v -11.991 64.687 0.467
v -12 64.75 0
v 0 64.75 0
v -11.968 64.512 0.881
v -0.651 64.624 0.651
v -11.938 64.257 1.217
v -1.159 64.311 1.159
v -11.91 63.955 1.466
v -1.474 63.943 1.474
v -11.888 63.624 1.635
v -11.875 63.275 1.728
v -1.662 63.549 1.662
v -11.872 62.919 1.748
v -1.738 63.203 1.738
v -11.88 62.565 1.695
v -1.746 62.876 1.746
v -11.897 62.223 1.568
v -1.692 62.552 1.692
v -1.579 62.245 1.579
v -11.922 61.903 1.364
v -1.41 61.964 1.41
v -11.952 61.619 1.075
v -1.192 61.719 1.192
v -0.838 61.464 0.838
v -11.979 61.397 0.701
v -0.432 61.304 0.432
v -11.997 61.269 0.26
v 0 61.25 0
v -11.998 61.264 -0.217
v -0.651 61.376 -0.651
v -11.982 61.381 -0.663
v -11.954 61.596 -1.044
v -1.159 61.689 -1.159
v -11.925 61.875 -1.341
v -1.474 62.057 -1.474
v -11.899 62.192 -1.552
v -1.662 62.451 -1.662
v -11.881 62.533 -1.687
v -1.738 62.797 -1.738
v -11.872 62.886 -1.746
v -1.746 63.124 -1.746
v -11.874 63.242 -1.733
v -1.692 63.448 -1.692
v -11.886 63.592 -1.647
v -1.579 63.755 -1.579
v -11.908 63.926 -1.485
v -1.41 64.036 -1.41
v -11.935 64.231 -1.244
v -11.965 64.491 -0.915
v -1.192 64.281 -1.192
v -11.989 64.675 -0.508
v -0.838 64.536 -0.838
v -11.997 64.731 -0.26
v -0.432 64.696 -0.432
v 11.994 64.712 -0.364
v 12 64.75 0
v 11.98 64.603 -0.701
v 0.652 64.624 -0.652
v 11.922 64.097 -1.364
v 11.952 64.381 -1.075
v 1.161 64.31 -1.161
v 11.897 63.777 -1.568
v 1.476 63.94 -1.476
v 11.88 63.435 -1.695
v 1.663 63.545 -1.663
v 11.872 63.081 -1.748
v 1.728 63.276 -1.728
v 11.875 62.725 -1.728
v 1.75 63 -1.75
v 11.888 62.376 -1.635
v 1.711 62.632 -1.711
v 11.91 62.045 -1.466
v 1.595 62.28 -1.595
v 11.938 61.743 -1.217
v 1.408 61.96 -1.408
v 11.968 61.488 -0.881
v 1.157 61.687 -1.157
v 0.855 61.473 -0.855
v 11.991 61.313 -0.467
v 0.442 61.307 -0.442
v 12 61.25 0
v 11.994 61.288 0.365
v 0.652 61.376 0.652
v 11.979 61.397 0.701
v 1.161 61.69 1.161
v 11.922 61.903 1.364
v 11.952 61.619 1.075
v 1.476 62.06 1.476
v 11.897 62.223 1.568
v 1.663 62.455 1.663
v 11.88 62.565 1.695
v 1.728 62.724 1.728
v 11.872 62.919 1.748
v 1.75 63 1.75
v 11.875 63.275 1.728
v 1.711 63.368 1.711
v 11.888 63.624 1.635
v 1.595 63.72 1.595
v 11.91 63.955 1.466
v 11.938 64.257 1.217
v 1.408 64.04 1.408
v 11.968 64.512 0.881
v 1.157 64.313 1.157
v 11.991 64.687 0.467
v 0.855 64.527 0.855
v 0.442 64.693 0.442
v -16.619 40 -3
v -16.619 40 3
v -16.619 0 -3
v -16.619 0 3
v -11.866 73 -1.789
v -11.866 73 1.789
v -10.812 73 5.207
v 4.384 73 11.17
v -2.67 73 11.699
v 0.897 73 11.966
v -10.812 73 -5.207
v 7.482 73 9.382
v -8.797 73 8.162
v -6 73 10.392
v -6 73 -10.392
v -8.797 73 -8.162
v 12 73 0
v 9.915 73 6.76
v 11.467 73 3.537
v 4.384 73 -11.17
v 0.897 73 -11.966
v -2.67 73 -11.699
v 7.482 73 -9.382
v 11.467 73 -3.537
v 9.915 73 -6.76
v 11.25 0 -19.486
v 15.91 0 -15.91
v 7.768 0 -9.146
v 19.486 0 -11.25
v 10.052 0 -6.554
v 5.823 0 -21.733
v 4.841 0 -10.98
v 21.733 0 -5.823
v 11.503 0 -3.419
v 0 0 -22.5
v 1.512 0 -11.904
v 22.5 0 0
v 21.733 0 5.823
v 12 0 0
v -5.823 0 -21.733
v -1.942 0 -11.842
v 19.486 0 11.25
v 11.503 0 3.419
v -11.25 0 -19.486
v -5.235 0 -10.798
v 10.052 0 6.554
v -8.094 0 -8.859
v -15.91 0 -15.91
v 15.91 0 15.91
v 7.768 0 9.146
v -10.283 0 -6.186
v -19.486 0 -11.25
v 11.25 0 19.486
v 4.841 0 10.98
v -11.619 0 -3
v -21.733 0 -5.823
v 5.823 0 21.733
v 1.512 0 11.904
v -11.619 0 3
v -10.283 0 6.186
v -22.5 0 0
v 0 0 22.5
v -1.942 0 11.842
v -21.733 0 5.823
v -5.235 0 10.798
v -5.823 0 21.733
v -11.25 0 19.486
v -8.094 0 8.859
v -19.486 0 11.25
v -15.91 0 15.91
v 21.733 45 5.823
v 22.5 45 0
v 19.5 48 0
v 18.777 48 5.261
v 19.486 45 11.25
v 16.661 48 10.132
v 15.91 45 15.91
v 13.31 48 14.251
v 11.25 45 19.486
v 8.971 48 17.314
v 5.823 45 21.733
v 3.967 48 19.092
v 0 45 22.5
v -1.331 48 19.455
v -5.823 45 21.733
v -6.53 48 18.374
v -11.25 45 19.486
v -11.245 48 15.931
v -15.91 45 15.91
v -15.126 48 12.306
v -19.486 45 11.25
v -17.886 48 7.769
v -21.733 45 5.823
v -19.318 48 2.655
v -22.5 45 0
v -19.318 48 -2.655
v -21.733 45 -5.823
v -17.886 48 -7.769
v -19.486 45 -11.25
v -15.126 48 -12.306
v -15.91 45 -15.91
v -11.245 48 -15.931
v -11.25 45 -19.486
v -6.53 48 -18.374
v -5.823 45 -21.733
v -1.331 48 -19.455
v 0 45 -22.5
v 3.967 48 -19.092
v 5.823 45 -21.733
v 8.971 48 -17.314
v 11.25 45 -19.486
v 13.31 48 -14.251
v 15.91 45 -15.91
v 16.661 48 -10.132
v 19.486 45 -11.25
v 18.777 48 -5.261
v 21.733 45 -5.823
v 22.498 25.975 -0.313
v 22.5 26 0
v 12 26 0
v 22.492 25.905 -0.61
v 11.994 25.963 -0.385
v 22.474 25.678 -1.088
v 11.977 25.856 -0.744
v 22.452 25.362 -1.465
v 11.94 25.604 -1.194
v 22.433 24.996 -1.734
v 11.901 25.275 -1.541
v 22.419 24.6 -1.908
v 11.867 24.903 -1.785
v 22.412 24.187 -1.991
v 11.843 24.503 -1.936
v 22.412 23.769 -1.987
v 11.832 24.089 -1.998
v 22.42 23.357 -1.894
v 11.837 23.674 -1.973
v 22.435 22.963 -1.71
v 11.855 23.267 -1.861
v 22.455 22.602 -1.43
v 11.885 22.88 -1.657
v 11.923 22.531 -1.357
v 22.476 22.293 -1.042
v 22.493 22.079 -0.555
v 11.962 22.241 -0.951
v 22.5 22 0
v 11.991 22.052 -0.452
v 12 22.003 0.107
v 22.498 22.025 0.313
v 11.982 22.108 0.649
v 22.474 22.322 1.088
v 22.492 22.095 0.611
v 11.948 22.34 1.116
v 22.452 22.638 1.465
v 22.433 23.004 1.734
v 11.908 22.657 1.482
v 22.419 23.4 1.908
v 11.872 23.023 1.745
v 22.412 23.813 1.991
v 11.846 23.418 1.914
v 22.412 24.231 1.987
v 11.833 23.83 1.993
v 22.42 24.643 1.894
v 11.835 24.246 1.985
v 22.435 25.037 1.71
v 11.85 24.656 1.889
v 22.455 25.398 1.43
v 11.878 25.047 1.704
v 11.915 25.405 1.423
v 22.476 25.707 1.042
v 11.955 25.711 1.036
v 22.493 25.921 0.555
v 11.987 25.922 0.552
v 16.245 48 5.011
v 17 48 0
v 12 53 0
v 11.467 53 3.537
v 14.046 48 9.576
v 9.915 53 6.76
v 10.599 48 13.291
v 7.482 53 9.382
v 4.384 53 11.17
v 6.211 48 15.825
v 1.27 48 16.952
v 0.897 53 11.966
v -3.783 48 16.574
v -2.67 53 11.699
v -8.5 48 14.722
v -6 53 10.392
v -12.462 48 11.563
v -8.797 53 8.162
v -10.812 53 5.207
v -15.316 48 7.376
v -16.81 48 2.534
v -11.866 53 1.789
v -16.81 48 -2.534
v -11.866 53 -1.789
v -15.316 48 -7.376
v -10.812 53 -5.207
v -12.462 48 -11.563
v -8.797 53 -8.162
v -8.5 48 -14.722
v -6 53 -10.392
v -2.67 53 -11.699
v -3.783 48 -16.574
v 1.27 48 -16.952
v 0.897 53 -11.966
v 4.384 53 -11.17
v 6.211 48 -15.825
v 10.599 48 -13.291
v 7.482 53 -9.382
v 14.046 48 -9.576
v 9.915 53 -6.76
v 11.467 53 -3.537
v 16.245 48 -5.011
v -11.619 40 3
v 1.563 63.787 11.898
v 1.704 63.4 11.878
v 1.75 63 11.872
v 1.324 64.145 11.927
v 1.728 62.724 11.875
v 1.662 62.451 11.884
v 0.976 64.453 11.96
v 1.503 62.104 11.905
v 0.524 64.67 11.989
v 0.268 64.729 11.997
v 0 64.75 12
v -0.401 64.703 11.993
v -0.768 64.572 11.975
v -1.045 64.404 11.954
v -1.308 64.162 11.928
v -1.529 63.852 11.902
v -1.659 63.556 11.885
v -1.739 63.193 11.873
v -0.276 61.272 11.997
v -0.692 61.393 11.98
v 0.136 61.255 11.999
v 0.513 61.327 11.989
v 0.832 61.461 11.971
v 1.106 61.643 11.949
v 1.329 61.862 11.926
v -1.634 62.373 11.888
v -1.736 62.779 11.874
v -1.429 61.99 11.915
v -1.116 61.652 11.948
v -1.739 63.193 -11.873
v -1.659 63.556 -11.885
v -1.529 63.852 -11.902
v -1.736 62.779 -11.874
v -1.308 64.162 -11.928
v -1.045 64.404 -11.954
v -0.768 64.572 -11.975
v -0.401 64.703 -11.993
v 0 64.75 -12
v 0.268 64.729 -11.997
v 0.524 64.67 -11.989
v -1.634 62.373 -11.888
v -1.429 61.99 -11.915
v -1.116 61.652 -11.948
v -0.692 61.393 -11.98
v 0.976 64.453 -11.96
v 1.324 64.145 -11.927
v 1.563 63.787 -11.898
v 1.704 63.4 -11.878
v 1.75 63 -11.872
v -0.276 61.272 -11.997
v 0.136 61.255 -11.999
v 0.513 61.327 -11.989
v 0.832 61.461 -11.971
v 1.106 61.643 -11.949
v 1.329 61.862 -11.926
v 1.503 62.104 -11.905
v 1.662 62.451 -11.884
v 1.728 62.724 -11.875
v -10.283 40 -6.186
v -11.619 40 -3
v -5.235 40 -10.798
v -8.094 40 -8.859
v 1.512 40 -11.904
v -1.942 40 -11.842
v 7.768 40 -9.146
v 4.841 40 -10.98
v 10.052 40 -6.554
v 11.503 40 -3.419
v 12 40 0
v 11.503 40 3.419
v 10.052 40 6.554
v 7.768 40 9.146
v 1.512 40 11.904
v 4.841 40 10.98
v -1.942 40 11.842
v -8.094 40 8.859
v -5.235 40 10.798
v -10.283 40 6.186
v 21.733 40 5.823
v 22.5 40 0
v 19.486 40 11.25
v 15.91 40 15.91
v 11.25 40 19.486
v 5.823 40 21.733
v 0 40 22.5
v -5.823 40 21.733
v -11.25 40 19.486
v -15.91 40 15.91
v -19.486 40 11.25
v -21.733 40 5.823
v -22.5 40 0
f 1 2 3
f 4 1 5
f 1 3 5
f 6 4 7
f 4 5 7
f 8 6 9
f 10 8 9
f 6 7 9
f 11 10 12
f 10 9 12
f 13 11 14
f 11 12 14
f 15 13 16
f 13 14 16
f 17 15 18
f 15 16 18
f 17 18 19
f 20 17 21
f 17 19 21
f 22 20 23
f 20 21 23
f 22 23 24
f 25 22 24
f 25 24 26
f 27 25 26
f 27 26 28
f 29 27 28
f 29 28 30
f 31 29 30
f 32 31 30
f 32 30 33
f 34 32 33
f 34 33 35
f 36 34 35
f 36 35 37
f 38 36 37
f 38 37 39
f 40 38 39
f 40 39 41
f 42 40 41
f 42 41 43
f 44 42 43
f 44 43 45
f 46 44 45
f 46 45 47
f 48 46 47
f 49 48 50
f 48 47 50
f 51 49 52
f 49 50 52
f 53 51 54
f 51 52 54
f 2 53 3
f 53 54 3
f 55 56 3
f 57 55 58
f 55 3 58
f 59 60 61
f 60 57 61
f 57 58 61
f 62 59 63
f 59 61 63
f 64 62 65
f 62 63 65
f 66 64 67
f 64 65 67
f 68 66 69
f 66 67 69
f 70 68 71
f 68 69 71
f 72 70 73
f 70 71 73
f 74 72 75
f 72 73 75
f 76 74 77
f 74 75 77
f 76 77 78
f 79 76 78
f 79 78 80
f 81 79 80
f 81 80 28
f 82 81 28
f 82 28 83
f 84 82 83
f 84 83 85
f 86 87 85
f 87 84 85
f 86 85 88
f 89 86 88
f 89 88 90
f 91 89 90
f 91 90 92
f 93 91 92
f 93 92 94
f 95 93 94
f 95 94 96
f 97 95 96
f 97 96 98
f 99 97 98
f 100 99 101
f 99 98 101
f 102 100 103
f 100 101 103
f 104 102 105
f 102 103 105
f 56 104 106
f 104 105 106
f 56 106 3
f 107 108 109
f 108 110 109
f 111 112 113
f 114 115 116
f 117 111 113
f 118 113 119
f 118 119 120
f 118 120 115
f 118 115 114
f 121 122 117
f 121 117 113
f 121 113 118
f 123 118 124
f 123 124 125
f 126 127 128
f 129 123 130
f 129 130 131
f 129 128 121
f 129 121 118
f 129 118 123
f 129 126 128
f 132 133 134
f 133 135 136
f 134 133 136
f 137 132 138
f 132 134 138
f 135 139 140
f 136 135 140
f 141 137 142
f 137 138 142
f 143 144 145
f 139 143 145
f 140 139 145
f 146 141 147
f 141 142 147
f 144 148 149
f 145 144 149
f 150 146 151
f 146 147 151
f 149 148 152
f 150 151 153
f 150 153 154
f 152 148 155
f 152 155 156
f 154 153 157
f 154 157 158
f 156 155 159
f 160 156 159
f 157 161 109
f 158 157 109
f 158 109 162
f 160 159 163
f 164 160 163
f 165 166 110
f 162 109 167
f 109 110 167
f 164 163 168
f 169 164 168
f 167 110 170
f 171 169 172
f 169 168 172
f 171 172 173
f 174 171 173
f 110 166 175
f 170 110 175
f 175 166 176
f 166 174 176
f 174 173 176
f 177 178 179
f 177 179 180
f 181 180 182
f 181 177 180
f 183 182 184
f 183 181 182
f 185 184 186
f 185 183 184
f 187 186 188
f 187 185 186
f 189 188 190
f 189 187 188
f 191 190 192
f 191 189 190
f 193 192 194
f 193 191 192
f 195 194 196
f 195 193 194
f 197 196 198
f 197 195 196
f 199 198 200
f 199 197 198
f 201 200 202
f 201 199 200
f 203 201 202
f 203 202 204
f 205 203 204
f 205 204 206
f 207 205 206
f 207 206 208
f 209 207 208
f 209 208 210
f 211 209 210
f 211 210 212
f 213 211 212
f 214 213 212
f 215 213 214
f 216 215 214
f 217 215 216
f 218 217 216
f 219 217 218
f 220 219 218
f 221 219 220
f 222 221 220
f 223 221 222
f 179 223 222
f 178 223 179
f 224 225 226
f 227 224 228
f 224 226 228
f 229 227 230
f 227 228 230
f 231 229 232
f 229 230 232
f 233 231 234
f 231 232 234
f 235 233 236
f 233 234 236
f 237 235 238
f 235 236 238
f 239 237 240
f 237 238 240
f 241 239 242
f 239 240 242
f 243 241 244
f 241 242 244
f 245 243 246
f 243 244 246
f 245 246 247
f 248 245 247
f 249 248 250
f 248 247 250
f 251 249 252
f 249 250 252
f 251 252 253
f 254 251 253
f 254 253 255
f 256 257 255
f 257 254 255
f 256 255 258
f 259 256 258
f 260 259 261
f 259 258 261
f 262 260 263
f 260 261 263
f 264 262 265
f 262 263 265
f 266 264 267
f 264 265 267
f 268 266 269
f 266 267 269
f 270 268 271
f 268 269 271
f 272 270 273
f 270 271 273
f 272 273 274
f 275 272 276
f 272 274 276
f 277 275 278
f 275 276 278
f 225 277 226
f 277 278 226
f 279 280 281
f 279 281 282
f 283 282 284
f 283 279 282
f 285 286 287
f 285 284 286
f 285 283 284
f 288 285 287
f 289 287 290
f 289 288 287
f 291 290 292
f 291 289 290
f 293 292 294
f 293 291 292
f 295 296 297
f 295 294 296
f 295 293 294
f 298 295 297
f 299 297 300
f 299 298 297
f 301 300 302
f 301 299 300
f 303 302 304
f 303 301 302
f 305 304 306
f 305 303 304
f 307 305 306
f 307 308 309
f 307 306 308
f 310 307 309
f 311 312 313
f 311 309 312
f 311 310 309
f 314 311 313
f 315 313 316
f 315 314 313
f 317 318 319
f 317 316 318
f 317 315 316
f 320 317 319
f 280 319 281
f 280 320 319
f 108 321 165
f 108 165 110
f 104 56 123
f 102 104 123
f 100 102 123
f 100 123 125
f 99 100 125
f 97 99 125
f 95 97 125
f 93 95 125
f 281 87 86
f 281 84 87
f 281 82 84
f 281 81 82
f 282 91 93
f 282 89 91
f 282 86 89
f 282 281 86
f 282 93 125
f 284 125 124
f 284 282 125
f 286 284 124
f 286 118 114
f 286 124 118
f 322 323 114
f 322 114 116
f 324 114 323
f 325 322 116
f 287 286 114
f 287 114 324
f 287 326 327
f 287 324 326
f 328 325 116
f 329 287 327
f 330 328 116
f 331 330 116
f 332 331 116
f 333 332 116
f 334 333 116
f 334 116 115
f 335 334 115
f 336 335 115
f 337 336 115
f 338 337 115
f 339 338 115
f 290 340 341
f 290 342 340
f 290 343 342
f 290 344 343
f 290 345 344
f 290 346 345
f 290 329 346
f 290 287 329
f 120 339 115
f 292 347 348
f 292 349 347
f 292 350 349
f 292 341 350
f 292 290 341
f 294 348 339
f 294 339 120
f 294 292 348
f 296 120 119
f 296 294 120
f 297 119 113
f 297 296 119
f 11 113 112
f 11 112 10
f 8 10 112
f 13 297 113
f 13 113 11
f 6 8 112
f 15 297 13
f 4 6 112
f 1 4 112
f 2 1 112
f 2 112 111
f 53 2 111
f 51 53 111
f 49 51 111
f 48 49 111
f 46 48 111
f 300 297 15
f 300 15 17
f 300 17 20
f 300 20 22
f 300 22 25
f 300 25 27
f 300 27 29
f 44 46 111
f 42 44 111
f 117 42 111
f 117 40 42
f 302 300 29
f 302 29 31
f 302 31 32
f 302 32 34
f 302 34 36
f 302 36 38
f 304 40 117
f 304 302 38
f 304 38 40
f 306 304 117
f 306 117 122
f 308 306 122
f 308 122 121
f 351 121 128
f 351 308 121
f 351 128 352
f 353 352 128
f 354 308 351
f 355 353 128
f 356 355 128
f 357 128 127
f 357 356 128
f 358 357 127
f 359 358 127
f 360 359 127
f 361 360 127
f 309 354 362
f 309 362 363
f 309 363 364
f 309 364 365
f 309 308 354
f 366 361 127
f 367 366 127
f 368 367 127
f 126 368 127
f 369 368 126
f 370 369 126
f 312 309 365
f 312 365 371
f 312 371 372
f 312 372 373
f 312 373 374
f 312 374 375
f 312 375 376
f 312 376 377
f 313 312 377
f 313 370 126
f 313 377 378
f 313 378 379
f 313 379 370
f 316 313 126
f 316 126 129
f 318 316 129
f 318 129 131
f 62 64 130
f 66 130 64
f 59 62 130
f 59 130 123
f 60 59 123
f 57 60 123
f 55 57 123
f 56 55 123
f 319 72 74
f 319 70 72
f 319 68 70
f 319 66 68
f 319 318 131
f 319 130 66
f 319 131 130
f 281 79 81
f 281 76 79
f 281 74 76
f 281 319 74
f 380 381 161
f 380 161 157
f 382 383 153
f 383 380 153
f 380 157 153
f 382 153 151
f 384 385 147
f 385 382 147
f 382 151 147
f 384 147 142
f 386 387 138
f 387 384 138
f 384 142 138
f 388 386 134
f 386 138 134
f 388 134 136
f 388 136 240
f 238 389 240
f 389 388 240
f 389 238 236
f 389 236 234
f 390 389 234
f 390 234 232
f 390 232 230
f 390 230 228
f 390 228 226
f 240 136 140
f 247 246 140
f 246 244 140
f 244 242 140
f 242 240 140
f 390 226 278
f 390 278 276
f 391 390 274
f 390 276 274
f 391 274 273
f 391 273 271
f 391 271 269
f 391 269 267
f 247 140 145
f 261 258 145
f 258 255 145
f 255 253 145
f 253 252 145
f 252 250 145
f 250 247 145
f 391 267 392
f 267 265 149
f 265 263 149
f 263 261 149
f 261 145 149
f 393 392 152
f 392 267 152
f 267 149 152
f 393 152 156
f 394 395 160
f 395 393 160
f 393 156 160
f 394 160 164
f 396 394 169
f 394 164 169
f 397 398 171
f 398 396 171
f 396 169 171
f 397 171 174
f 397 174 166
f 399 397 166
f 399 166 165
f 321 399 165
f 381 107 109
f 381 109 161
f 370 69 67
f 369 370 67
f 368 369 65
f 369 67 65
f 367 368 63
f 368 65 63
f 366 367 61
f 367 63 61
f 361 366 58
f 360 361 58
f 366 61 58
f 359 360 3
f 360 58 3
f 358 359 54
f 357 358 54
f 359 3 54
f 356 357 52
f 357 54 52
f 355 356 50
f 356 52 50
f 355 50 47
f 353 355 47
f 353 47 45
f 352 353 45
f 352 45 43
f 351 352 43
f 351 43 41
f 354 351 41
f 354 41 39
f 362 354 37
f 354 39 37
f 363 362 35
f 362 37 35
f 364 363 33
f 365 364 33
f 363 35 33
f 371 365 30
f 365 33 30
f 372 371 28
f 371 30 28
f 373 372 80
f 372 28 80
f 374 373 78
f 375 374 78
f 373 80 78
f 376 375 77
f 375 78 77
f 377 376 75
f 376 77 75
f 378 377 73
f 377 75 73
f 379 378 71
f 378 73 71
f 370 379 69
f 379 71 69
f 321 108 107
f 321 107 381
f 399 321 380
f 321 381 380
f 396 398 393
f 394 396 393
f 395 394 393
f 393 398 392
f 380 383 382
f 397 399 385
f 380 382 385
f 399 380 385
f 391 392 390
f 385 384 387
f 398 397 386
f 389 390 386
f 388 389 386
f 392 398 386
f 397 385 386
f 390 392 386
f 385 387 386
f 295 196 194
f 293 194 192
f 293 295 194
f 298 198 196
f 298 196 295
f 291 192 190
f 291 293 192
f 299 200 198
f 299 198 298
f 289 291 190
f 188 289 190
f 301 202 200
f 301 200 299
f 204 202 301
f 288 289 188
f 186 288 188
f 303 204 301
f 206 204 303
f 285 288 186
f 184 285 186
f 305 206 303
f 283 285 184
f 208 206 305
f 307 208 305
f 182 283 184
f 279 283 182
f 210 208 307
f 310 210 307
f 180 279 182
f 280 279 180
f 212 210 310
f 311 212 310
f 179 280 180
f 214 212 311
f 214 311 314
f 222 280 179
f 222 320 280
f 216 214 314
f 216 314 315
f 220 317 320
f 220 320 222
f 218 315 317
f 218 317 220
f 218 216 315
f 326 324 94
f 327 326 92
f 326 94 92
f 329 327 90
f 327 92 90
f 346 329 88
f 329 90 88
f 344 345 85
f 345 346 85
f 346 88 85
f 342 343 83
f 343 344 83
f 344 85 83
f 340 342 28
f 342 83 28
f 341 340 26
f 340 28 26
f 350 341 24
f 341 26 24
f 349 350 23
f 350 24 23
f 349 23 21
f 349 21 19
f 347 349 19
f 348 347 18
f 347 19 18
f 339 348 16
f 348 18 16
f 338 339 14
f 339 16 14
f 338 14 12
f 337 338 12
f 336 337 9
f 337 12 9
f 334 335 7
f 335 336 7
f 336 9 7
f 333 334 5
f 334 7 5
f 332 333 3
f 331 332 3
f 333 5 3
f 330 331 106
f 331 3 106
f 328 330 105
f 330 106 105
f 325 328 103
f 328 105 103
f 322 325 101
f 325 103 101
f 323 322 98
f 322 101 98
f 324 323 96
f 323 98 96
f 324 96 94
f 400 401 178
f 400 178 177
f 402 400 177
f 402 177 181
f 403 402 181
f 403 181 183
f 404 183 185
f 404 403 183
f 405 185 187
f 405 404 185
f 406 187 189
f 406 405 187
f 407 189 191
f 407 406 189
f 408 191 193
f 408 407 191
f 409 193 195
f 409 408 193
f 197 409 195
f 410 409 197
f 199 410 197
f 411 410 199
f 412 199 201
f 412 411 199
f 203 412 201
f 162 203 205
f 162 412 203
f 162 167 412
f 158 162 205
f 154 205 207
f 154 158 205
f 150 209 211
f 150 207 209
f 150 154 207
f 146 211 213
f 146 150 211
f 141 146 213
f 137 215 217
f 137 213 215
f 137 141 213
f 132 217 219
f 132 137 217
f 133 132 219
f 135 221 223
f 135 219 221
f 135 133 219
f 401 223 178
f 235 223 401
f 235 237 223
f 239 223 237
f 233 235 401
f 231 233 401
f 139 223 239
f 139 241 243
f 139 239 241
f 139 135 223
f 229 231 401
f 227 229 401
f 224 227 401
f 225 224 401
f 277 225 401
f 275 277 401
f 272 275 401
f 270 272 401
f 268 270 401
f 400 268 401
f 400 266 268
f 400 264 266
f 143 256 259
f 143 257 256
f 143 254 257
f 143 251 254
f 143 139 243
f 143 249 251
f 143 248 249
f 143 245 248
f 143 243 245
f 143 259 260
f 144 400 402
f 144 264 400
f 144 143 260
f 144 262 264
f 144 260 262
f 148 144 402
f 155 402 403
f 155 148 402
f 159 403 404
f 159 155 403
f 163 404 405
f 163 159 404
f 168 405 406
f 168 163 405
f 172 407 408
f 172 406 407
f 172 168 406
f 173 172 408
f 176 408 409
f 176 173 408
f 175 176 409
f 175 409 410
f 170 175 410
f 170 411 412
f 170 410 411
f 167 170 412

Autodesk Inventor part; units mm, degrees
ref_plane "YZ Plane" through (0, 0, 0) normal (1, 0, 0) x (0, 1, 0)
ref_plane "XZ Plane" through (0, 0, 0) normal (0, 1, 0) x (-1, 0, 0)
ref_plane "XY Plane" through (0, 0, 0) normal (0, 0, 1) x (1, 0, 0)
sketch "Sketch1" plane through (0, 0, 0) normal (0, 1, 0) x (-1, 0, 0)
  circle A0 centre (0, 0) radius 12
  circle A1 centre (0, 0) radius 22.5
  line L0 (11.619, 3) -> (16.619, 3)
  line L1 (16.619, 3) -> (16.619, -3)
  line L2 (16.619, -3) -> (11.619, -3)
  line L3 (11.619, -3) -> (11.619, 3)
  dimension "d0" = 24
  dimension "d1" = 45
  dimension "d2" = 6
  dimension "d3" = 5
extrude "Extrusion1" add sketch "Sketch1" along normal blind 40
sketch "Sketch2" plane through (0, 40, 0) normal (0, 1, 0) x (1, 0, 0)
  circle A0 centre (0, 0) radius 22.5
extrude "Extrusion2" add sketch "Sketch2" along normal blind 8
sketch "Sketch3" plane through (0, 48, 0) normal (0, 1, 0) x (1, 0, 0)
  circle A0 centre (0, 0) radius 12
  dimension "d29" = 24
extrude "Extrusion3" add sketch "Sketch3" along normal blind 25
sketch "Sketch4" plane through (0, 0, 0) normal (1, 0, 0) x (0, 1, 0)
  circle A0 centre (63, 0) radius 1.75
  line L0 (48, -22.5) -> (48, 22.5) projected
  point P0 (0, 0)
  dimension "d10" = 15
  dimension "d11" = 3.5
extrude "Extrusion4" cut sketch "Sketch4" along normal through all both and the other way through all
sketch "Sketch5" plane through (0, 0, 0) normal (0, 0, 1) x (1, 0, 0)
  circle A0 centre (0, 63) radius 1.75
  line L0 (-12, 64.75) -> (12, 64.75) projected
  line L1 (22.5, 48) -> (-22.5, 48) projected
  point P0 (0, 0)
  dimension "d14" = 15
extrude "Extrusion5" cut sketch "Sketch5" along normal through all both and the other way through all
sketch "Sketch6" plane through (0, 0, 0) normal (1, 0, 0) x (0, 1, 0)
  circle A0 centre (24, 0) radius 2
  line L0 (0, -22.5) -> (0, 22.5) projected
  line L1 (48, -22.5) -> (48, 22.5) projected
  point P0 (0, 0)
  dimension "d18" = 4
  dimension "d19" = 24
  dimension "d20" = 24
extrude "Extrusion6" cut sketch "Sketch6" along normal through all
chamfer "Chamfer1" distance 3 angle 45 1 edges at (-22.5, 48, 0)
chamfer "Chamfer2" distance 5 angle 45 1 edges at (-12, 48, 0)
equation "\"d19\" = d20"
properties part number "shaft adapter"
